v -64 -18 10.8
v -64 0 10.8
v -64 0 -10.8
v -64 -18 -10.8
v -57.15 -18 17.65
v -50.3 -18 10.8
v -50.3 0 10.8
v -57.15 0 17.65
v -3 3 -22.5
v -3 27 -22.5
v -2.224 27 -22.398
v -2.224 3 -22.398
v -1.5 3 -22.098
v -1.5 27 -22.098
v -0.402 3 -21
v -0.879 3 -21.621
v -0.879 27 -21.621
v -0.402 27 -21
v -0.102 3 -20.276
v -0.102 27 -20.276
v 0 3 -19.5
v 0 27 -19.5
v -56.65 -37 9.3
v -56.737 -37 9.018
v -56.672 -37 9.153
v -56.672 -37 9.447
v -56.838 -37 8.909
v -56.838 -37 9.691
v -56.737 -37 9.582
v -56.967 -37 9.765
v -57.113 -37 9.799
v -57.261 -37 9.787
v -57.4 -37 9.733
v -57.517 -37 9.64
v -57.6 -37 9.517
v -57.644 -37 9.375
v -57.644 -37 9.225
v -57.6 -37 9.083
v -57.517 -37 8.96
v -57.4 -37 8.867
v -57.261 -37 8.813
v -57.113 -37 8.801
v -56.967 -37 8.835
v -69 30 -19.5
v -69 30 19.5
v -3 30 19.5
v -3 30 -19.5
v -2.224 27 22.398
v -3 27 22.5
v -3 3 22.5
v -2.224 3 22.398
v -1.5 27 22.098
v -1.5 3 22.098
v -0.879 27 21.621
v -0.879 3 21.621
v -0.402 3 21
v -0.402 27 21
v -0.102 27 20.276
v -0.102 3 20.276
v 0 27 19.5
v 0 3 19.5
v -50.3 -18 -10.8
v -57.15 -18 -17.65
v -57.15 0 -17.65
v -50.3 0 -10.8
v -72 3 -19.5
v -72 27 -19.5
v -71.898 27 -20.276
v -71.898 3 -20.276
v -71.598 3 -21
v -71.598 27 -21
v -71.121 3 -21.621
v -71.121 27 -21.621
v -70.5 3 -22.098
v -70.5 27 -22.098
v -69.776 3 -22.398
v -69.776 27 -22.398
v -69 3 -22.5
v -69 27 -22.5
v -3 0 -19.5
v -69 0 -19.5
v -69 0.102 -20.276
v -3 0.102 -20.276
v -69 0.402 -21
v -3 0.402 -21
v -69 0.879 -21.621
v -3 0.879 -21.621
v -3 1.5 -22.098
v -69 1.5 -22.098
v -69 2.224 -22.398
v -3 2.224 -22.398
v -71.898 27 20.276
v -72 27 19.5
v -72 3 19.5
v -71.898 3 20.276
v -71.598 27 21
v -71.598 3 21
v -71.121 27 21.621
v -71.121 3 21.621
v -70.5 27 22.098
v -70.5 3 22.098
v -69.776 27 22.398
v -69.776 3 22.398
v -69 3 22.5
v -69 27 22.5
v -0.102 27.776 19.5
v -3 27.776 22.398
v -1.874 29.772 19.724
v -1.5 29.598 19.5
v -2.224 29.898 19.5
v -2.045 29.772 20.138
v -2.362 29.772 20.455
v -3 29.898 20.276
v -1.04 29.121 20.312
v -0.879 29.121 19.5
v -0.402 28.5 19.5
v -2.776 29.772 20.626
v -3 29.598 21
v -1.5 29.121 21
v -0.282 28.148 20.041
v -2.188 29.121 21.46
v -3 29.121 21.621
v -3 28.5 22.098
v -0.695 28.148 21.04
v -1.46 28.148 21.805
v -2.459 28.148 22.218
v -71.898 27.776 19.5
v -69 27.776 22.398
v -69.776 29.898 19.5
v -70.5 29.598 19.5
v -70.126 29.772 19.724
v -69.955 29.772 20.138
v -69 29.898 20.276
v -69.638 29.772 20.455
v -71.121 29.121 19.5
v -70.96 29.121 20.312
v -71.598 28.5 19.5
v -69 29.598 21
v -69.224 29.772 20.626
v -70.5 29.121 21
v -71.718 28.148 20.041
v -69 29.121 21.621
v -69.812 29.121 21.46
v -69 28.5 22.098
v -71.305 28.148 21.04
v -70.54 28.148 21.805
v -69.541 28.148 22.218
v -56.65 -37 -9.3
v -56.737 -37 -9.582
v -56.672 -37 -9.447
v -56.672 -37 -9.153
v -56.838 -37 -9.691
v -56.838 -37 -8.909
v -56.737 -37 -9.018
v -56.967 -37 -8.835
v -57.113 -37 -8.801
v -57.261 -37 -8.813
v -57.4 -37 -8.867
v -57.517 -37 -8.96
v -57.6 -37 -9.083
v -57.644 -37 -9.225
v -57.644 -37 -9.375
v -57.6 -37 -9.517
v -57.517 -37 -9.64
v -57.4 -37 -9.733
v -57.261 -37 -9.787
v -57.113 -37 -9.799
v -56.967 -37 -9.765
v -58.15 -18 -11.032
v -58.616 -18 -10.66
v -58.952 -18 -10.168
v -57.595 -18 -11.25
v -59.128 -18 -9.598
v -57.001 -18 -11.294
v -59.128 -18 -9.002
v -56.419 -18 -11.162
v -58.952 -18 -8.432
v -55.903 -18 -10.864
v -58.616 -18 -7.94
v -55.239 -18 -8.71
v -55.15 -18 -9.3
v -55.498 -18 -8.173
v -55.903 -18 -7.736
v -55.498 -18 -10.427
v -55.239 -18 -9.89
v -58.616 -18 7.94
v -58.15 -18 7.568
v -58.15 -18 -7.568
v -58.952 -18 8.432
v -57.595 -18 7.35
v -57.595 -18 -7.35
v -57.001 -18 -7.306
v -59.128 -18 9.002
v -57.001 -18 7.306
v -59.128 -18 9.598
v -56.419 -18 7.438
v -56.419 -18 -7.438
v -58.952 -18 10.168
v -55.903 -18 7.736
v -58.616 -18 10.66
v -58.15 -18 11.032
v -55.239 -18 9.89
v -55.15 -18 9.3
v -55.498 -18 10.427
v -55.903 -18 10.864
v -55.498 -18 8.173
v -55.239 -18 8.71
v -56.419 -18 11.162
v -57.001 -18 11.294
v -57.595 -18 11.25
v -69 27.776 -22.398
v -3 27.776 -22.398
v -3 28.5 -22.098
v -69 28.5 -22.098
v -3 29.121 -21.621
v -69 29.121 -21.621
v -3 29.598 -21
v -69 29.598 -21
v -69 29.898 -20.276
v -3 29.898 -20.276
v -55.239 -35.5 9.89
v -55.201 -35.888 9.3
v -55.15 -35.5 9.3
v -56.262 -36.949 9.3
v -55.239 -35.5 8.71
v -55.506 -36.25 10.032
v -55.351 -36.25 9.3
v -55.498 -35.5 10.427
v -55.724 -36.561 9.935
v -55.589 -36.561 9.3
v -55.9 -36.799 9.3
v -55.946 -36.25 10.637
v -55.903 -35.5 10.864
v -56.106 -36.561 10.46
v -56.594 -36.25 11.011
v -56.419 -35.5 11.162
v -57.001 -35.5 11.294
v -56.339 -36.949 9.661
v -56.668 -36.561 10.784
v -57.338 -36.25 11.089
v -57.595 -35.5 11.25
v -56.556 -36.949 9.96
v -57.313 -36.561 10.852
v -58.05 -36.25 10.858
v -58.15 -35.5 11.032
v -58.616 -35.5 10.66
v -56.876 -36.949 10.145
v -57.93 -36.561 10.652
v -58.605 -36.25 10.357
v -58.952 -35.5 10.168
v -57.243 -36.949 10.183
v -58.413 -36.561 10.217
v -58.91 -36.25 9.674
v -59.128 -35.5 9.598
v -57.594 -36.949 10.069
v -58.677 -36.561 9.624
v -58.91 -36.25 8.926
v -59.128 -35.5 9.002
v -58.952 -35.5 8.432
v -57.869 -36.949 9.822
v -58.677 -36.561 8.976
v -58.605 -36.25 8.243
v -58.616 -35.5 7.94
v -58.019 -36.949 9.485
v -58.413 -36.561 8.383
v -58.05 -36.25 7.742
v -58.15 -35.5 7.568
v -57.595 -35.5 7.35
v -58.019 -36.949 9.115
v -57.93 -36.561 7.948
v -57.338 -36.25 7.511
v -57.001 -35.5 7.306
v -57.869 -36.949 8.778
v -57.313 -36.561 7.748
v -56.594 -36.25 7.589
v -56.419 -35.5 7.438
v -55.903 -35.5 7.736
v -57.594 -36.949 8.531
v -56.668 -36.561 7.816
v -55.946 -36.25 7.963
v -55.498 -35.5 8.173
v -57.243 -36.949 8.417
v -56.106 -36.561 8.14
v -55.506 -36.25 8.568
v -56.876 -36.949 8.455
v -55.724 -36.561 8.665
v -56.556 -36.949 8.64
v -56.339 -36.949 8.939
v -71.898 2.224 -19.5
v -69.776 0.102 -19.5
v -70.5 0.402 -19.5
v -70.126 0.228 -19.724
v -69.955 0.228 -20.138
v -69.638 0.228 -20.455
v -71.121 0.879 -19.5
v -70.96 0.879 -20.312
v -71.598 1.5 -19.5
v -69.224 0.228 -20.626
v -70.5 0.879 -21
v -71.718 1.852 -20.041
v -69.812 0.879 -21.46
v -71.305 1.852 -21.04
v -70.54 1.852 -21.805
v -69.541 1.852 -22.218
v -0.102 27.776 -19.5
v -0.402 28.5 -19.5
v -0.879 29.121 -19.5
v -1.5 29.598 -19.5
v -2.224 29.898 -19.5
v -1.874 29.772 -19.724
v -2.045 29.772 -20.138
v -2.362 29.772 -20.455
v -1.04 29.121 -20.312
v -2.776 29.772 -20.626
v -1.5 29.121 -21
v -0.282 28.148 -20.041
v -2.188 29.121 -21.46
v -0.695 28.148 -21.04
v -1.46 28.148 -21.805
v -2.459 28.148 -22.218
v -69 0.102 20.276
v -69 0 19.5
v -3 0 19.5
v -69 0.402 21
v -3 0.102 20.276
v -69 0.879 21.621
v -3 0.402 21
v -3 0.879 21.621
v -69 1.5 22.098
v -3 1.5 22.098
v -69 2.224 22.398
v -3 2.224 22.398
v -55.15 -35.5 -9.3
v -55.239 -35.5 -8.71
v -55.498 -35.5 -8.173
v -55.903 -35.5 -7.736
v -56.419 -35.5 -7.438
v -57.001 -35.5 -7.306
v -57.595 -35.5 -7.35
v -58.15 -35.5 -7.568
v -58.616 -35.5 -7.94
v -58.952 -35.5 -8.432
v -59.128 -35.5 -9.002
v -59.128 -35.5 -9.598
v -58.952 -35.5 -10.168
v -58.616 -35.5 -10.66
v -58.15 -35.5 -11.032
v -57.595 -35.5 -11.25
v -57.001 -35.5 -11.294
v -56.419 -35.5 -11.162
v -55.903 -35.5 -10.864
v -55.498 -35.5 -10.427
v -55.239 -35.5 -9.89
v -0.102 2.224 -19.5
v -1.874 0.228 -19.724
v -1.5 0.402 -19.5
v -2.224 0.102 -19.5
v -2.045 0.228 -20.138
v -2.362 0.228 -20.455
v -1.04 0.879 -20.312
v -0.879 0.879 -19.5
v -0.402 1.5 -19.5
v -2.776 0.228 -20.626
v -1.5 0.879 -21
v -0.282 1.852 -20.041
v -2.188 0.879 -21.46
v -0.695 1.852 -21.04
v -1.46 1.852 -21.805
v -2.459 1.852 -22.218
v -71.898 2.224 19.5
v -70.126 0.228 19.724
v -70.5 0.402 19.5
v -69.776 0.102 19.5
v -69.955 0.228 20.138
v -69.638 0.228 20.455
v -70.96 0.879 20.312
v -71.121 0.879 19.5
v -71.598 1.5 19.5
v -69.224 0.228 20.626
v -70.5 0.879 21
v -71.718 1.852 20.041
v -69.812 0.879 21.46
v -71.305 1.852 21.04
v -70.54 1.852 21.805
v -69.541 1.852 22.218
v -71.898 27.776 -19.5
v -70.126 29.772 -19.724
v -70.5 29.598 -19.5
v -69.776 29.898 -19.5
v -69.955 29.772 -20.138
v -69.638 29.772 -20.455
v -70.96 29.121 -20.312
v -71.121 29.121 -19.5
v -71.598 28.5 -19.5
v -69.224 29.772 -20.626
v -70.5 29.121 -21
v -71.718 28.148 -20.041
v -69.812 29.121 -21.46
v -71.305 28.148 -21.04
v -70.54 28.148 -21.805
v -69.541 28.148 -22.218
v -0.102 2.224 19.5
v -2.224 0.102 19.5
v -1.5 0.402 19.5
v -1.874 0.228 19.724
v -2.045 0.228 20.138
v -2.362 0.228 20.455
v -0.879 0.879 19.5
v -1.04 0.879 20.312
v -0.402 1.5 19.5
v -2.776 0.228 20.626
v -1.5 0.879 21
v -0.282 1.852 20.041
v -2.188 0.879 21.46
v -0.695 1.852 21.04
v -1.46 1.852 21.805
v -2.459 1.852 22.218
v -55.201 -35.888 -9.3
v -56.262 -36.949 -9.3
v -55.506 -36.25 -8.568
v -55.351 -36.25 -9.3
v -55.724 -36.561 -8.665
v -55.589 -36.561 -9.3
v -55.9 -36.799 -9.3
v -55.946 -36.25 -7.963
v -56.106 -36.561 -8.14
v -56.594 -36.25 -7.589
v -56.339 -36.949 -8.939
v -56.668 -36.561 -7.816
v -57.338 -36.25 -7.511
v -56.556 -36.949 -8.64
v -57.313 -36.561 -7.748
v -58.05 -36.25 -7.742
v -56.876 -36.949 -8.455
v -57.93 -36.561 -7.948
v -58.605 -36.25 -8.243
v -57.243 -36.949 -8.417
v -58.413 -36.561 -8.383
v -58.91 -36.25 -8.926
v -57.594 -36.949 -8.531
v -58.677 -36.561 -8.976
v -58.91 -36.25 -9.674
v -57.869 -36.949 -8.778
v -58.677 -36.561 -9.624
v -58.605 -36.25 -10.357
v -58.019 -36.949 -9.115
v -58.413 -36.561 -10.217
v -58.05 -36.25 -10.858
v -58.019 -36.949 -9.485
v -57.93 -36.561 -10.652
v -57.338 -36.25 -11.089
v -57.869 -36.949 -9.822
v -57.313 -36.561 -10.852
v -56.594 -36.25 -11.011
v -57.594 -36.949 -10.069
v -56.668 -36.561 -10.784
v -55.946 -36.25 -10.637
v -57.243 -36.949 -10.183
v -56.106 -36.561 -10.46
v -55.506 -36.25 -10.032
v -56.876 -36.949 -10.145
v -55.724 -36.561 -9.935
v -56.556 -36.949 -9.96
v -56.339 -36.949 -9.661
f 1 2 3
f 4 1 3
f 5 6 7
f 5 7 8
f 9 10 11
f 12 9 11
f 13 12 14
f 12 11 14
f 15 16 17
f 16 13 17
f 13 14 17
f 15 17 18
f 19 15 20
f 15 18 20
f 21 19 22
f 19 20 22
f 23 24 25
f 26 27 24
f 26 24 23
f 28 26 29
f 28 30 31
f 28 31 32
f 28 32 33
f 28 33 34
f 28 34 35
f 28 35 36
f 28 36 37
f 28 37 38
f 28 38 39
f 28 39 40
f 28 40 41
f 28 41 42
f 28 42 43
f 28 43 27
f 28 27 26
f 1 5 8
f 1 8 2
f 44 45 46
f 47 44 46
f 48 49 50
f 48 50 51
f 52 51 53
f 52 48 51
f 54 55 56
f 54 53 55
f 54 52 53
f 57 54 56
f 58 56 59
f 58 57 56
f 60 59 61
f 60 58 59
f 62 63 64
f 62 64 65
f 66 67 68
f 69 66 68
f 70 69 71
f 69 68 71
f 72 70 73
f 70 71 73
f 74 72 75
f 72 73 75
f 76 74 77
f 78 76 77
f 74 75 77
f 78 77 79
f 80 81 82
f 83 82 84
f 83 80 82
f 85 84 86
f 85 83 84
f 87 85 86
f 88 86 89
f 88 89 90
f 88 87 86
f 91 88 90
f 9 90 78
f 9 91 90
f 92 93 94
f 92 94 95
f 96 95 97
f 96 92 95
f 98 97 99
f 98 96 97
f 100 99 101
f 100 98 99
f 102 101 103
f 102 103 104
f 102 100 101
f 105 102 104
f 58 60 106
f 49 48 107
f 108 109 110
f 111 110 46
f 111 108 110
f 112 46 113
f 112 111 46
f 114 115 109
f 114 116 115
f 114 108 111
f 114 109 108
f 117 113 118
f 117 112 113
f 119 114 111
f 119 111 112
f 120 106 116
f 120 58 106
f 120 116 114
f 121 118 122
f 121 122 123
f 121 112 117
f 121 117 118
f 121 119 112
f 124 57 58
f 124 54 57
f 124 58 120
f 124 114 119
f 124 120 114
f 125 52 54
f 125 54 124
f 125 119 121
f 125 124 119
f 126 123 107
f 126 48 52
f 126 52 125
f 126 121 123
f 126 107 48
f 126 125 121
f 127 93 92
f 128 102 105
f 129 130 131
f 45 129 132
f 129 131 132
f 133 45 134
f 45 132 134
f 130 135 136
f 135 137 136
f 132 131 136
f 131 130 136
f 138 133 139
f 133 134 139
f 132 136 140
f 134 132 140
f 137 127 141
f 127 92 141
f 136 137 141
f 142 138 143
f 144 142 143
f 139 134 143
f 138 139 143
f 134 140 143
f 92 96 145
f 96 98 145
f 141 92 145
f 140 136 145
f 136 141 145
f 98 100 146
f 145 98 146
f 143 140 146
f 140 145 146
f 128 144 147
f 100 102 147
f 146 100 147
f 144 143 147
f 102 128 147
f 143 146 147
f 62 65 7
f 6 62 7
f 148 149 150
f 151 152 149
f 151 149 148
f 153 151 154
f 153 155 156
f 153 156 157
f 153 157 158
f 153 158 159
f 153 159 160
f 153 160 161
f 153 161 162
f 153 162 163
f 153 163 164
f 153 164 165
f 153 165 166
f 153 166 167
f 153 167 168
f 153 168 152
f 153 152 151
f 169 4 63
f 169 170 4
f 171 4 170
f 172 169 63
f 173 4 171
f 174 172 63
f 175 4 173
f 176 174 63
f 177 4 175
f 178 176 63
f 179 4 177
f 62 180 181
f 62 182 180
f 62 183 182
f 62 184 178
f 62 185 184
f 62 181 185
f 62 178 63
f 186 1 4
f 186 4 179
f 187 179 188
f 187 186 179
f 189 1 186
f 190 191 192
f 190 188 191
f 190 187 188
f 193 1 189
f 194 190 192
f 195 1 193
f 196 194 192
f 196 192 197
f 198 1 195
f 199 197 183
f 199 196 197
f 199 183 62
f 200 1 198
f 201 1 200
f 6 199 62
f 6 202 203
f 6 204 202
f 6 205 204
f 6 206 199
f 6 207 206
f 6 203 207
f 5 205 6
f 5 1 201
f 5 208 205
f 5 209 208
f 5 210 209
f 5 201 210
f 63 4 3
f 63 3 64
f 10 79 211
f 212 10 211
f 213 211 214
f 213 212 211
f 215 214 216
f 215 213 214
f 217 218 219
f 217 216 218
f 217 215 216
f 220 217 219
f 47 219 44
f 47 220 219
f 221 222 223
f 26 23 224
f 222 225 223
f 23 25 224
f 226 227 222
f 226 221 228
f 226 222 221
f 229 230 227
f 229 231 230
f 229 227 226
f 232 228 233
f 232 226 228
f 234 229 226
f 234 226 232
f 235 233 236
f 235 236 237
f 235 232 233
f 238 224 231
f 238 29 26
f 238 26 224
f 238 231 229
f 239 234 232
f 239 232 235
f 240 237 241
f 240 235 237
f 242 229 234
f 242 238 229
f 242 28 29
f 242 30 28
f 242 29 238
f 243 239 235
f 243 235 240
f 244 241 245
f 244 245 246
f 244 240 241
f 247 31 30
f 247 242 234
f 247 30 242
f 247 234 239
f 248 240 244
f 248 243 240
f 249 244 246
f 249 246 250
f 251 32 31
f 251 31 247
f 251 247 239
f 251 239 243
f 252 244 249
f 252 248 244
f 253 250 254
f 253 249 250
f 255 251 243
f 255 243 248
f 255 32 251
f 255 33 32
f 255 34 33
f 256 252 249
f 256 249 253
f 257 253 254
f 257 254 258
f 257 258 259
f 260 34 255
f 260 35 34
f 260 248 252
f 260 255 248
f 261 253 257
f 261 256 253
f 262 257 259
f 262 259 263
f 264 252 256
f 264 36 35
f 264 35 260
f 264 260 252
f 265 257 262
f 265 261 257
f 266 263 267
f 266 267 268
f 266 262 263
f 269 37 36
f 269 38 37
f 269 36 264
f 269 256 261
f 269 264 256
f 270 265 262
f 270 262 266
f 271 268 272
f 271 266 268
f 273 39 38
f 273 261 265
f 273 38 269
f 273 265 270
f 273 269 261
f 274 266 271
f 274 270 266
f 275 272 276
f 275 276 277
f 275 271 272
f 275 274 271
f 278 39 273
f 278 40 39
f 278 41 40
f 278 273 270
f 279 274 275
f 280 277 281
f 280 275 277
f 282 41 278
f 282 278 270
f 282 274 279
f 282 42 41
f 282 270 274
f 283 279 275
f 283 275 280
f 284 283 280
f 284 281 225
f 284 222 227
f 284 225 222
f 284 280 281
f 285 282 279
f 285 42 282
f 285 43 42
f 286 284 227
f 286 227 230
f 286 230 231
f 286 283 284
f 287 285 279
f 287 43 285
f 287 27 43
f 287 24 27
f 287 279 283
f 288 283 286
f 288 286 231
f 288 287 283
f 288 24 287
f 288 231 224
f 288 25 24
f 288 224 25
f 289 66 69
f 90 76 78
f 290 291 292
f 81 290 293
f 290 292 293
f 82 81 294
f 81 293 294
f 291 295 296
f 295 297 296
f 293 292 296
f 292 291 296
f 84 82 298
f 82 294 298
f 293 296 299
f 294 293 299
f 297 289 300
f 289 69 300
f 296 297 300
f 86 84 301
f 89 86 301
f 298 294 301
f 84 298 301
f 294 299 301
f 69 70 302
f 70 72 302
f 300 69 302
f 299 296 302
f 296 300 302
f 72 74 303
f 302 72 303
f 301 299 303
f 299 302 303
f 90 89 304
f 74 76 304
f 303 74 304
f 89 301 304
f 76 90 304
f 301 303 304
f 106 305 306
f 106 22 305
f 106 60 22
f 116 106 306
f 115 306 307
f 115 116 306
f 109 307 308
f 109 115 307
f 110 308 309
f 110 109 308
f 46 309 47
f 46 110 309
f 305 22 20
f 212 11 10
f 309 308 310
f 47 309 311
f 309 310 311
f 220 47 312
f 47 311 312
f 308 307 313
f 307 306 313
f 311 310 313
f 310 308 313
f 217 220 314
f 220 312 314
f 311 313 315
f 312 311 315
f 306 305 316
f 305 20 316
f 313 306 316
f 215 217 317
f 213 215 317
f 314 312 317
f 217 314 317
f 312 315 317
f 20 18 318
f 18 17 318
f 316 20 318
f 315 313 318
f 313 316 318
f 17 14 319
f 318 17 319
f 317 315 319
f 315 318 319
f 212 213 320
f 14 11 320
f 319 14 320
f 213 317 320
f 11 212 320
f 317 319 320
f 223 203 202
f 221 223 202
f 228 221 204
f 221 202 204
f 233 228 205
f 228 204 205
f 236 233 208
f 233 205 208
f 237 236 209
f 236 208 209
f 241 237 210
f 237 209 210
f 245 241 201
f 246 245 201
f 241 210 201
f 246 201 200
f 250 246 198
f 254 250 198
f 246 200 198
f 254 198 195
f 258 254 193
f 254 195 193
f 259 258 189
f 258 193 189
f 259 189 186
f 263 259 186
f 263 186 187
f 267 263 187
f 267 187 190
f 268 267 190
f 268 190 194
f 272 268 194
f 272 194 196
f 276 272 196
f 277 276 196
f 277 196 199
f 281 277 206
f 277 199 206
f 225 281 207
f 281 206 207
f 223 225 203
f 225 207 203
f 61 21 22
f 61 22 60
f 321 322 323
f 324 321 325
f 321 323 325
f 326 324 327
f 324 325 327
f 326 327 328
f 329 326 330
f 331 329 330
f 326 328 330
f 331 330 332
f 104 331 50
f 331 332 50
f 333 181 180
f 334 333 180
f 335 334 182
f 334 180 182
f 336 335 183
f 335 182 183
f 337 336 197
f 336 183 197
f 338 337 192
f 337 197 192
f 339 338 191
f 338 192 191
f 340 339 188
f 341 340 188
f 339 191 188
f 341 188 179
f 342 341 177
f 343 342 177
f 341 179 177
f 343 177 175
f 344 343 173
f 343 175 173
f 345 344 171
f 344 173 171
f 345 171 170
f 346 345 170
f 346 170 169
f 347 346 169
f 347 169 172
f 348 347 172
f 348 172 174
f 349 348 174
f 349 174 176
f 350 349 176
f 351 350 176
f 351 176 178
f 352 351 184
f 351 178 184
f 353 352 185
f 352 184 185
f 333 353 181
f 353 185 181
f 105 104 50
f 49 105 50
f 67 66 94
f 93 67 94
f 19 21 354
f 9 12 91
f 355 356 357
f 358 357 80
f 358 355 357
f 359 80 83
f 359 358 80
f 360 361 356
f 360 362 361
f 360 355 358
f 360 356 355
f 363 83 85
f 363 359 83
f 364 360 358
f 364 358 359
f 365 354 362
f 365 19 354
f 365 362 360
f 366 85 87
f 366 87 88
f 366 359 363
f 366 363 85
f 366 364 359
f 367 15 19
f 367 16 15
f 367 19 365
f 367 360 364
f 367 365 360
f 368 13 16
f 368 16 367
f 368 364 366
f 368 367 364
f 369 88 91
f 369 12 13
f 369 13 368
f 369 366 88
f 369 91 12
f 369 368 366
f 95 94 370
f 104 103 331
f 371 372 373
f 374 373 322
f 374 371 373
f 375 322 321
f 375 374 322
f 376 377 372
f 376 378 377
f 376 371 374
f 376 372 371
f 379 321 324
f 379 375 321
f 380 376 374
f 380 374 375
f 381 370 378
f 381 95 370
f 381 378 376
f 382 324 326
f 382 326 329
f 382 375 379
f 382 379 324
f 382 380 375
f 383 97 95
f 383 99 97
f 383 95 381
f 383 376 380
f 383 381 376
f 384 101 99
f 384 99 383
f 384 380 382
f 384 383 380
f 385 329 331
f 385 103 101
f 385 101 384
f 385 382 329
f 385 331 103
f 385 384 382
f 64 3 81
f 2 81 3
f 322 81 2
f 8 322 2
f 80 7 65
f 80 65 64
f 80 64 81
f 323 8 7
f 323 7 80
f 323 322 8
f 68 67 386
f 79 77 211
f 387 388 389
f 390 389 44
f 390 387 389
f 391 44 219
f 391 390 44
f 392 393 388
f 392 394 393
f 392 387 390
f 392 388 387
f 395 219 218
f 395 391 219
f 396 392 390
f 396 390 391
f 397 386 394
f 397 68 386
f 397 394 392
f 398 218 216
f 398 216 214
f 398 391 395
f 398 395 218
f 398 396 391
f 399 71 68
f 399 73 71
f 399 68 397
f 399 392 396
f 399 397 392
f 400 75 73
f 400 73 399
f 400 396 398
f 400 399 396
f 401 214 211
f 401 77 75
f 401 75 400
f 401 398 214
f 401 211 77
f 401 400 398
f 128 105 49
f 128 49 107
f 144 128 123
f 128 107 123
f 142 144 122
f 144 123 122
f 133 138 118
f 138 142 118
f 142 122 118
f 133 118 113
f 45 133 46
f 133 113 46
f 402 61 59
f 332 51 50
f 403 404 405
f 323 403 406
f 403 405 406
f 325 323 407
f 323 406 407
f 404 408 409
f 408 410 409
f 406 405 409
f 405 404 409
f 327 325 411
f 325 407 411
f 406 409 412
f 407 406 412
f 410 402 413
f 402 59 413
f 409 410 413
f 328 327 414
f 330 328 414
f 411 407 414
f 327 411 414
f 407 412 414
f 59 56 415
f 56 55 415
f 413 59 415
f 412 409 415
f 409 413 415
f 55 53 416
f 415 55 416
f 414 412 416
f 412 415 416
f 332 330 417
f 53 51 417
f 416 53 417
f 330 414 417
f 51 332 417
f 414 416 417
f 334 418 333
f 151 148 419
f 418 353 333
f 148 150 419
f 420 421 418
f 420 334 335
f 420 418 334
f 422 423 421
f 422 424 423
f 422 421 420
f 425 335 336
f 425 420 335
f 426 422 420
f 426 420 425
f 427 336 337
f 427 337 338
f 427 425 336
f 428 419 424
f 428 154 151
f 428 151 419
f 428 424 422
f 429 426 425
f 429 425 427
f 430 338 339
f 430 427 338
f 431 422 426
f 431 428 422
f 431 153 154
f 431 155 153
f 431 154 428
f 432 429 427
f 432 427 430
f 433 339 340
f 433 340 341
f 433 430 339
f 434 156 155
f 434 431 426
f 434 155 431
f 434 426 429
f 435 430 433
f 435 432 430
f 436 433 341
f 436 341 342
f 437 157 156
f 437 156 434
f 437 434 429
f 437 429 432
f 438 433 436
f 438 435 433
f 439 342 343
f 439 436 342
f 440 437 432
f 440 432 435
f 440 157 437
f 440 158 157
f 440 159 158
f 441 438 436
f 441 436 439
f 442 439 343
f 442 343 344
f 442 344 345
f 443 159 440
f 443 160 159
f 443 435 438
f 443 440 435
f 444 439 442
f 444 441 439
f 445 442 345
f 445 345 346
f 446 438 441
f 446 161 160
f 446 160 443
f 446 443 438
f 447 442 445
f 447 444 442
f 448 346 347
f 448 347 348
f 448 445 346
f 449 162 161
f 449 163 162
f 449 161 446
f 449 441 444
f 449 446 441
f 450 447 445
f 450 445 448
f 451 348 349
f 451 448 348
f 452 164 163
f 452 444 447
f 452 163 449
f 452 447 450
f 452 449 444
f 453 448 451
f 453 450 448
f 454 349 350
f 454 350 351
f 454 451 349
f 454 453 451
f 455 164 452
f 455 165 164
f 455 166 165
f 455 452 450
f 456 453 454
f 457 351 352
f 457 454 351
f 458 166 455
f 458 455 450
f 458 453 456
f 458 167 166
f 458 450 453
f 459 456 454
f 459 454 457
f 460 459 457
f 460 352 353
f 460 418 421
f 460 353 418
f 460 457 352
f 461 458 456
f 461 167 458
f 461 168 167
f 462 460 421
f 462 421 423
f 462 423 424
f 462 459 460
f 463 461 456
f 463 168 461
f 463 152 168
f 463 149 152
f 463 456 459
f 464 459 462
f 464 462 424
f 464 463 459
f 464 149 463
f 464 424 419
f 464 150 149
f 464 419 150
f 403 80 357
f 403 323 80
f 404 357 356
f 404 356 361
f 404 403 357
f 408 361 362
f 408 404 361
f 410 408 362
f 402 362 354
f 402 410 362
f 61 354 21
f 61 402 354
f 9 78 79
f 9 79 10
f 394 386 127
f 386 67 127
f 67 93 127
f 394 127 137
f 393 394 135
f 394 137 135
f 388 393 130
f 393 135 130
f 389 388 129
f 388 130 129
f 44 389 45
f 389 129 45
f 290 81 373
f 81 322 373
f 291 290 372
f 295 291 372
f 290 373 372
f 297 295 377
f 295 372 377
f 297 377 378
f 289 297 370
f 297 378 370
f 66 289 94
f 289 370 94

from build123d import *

# Parameters (mm, degrees)
F0_W     = 72
F0_H     = 45
F1_DEPTH = 30
F3_DEPTH = 18
F4_R     = 2
F5_DEPTH = 19
F6_R     = 1.5
F7_R     = 3


with BuildPart() as f1:
    # F0 (on Front) → F1 (new body)
    with BuildSketch(Plane.XZ):
        with Locations((-36, 0)):
            Rectangle(F0_W, F0_H)
    extrude(amount=-F1_DEPTH)

    # F2 (on face) → F3 (join)
    with BuildSketch(Plane.XZ):
        Polygon((-64, 10.8), (-64, -10.8), (-57.15, -17.65), (-50.3, -10.8), (-50.3, 10.8), (-57.15, 17.65), align=None)
    extrude(amount=F3_DEPTH)

    # F4 (on face) → F5 (join)
    with BuildSketch(Plane.XZ.offset(18)):
        with Locations((-57.15, 9.3)):
            Circle(F4_R)
        with Locations((-57.15, -9.3)):
            Circle(F4_R)
    extrude(amount=F5_DEPTH)

    # F6
    f6_edges = [f1.edges().sort_by_distance(p)[0] for p in [
        (-59.15, -37, 9.3),
        (-59.15, -37, -9.3),
    ]]
    fillet(f6_edges, radius=F6_R)

    # F7
    f7_edges = [f1.edges().sort_by_distance(p)[0] for p in [
        (-72, 15, 22.5),
        (-72, 15, -22.5),
        (-72, 0, 0),
        (-72, 30, 0),
        (0, 15, -22.5),
        (0, 15, 22.5),
        (0, 0, 0),
        (0, 30, 0),
        (-36, 0, 22.5),
        (-36, 30, 22.5),
        (-36, 0, -22.5),
        (-36, 30, -22.5),
    ]]
    fillet(f7_edges, radius=F7_R)


solid = f1.part
